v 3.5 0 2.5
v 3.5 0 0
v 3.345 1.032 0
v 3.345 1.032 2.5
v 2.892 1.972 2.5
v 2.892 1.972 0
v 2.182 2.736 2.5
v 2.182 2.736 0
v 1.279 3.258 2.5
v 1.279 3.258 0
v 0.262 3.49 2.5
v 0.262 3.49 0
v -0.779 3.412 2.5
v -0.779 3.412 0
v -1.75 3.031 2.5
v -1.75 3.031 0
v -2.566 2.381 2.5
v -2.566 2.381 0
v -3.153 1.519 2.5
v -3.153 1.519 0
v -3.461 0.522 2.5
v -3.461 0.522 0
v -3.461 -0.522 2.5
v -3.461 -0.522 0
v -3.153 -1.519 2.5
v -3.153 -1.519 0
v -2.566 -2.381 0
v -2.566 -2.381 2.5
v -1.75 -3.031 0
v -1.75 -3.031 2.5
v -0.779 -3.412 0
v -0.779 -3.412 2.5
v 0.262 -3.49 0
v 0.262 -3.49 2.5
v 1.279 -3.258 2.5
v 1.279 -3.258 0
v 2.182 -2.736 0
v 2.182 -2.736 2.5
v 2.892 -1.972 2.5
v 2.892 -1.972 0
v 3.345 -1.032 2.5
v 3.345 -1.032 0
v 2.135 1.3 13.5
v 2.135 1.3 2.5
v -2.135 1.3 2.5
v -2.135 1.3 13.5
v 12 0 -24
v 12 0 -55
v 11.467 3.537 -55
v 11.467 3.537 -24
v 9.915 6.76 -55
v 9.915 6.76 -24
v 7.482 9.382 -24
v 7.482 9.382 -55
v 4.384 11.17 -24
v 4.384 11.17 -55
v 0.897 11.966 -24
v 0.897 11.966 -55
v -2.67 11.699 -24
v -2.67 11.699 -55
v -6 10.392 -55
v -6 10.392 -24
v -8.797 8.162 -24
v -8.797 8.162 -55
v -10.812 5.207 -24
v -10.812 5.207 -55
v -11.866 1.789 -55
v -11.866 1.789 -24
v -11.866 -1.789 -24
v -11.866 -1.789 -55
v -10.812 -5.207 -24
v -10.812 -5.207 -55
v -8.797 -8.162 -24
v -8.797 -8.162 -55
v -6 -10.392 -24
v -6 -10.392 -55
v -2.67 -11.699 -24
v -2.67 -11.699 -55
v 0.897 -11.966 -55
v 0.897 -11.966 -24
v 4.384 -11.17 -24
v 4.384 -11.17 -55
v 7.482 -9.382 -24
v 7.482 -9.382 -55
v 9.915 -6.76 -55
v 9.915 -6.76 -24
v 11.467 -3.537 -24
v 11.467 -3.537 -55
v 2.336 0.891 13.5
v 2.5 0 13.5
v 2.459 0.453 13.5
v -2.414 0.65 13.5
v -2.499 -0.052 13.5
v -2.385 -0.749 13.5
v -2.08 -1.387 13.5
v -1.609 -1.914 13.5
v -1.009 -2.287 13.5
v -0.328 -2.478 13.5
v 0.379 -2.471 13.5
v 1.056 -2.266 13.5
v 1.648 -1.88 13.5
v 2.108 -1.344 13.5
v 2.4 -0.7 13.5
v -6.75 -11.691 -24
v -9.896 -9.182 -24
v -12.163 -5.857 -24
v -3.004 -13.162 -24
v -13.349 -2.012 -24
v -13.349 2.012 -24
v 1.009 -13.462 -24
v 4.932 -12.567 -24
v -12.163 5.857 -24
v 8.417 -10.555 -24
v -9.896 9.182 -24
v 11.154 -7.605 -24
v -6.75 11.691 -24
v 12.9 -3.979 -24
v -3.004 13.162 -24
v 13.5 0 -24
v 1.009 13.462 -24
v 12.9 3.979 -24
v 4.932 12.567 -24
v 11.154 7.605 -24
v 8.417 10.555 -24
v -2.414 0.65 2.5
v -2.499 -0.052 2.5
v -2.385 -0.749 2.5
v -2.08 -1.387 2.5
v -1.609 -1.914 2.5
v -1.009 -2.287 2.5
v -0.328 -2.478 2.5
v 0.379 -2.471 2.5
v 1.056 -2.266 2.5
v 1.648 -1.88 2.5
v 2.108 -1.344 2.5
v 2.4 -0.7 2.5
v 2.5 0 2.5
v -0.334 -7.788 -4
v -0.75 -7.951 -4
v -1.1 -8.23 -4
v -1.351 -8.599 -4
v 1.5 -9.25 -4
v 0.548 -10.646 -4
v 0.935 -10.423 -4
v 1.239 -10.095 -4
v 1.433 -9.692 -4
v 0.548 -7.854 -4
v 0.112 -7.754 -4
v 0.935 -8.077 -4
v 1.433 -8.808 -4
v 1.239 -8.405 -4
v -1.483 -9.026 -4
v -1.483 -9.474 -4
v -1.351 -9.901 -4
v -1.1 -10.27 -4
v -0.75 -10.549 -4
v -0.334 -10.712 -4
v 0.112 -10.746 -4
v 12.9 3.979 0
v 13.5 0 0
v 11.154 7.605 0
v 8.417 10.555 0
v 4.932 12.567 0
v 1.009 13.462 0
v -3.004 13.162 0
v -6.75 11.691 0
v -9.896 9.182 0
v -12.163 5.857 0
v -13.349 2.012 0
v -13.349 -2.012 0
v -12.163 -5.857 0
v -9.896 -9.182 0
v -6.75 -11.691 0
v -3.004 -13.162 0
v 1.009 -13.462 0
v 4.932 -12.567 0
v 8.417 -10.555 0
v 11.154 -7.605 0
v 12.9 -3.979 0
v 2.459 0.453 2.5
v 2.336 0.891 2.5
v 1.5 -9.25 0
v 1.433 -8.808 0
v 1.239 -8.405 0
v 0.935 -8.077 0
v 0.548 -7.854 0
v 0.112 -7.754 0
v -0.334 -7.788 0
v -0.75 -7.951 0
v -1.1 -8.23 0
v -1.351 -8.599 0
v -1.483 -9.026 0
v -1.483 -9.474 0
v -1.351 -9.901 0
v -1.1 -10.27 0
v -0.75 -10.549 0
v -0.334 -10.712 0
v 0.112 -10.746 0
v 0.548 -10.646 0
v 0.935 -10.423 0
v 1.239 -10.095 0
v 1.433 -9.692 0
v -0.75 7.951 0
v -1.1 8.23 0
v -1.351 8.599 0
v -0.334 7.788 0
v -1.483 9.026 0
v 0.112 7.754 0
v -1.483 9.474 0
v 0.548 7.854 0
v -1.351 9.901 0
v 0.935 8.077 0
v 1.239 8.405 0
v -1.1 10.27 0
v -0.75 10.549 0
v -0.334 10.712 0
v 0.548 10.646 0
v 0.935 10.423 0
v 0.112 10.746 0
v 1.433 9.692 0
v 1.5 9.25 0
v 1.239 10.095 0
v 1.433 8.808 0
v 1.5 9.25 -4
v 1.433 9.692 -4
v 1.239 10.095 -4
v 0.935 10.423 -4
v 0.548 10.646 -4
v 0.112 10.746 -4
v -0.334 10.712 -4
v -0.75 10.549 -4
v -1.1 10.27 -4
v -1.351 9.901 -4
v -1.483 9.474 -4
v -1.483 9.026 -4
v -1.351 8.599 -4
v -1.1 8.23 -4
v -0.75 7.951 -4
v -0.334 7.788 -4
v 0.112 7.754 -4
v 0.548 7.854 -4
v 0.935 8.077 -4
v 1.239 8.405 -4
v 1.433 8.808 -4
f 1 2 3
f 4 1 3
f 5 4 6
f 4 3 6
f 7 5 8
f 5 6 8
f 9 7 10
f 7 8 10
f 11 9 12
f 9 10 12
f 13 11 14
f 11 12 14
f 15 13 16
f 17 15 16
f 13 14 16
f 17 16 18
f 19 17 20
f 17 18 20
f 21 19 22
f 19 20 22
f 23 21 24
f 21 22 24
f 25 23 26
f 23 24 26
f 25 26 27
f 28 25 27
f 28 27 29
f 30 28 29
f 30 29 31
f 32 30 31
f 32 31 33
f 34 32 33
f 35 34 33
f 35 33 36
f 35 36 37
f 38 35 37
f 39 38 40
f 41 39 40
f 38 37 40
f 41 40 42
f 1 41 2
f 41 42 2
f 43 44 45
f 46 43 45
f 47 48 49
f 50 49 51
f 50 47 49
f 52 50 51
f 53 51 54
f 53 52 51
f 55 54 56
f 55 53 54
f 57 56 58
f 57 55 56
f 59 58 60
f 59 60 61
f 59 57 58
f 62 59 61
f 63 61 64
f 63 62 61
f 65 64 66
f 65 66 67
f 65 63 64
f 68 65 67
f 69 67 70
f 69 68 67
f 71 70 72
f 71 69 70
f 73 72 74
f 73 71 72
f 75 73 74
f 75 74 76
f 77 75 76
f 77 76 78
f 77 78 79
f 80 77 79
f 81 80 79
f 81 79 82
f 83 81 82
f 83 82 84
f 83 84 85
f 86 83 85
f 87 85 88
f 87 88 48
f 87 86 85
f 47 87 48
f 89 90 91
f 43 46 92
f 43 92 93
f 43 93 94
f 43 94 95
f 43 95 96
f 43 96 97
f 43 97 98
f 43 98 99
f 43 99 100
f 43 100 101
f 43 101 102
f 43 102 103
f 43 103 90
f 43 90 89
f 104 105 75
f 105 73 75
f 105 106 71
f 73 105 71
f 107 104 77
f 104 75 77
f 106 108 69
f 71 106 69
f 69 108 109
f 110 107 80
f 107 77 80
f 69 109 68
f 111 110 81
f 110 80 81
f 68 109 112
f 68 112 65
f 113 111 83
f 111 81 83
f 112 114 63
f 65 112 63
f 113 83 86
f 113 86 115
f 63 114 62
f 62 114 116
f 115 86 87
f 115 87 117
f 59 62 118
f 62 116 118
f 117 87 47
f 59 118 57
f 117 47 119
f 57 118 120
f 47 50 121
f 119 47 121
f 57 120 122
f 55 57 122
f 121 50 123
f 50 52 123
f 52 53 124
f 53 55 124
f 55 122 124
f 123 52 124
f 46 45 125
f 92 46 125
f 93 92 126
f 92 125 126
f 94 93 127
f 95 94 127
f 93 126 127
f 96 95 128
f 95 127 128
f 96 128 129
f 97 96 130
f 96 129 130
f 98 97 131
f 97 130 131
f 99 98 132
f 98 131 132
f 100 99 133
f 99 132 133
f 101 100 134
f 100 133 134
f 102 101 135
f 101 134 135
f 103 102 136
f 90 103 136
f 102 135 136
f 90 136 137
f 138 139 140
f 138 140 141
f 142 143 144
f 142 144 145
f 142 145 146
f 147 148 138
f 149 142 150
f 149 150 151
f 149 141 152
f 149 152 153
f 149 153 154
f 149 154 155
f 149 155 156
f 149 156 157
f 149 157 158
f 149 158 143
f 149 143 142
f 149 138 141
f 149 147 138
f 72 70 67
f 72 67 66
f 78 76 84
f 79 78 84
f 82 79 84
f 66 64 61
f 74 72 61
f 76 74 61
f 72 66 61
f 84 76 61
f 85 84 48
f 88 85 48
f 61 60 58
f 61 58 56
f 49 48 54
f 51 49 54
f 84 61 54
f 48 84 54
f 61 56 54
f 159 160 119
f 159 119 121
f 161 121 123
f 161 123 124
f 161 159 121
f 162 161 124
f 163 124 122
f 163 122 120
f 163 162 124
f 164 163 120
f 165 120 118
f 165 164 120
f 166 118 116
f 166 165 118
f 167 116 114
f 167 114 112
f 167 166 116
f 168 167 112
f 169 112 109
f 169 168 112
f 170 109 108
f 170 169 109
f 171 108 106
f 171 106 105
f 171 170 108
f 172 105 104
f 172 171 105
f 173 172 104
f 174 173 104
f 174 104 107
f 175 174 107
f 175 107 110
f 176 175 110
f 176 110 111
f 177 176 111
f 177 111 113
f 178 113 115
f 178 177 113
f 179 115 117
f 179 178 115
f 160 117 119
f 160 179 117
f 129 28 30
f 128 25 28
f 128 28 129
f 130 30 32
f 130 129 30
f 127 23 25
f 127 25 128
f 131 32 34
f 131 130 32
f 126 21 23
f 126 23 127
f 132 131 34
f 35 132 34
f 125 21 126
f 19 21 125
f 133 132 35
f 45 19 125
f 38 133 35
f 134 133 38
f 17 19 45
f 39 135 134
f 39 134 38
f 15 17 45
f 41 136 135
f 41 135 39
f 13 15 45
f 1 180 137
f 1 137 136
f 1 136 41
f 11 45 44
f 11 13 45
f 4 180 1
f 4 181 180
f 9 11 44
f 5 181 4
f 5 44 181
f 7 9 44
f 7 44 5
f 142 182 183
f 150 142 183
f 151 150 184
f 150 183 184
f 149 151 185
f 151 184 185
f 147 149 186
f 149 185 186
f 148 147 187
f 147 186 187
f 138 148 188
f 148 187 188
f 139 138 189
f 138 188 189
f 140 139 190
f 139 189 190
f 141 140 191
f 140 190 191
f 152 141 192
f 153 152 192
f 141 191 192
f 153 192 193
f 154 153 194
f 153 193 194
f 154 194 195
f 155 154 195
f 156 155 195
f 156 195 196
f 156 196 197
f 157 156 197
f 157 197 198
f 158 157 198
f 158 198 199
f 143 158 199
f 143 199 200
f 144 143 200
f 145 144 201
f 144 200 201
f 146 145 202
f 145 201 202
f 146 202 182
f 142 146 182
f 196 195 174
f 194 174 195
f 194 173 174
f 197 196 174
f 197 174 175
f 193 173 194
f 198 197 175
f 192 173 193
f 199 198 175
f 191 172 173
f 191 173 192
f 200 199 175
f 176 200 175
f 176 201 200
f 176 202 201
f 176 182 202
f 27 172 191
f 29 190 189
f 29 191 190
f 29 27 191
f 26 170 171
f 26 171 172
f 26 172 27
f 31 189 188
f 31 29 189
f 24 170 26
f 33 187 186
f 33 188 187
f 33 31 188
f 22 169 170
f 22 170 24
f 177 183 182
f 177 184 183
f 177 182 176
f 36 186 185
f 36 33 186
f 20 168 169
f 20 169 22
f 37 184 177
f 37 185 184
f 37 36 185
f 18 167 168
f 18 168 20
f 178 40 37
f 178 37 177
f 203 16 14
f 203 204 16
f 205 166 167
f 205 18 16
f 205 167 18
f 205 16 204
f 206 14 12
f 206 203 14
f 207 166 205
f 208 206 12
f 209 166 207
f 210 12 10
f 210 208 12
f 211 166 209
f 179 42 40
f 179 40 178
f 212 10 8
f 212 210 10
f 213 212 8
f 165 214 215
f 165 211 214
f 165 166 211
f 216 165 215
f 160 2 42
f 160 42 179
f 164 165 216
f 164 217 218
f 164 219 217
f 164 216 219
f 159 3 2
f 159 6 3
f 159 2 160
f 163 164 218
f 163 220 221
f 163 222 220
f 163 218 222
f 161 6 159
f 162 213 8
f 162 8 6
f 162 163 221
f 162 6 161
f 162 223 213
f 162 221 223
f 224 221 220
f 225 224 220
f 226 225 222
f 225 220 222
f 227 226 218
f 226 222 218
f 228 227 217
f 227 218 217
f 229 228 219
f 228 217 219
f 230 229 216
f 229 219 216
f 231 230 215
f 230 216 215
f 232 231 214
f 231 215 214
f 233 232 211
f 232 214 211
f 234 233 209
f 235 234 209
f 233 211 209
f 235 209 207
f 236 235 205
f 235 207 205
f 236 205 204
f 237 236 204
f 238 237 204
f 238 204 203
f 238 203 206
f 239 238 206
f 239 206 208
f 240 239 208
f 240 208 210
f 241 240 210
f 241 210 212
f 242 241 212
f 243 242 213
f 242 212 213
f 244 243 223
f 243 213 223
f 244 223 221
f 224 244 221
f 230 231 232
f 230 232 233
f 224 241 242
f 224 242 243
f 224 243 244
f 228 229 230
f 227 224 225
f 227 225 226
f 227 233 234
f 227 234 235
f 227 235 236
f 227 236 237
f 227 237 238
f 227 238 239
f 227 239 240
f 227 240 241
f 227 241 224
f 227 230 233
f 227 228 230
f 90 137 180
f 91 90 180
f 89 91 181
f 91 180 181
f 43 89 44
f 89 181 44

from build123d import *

# Parameters (mm, degrees)
SKETCH1_R           = 13.5
BOSS_EXTRUDE1_DEPTH = 24
BOSS_EXTRUDE2_START = -24
SKETCH1_3_R         = 12
BOSS_EXTRUDE2_DEPTH = 31
SKETCH2_R           = 3.5
BOSS_EXTRUDE3_DEPTH = 2.5
BOSS_EXTRUDE4_START = 2.5
BOSS_EXTRUDE4_DEPTH = 11
SKETCH3_R           = 1.5
CUT_EXTRUDE1_DEPTH  = 4


with BuildPart() as part:
    # Sketch1 → Boss-Extrude1 (new body)
    with BuildSketch(Plane.XY):
        Circle(SKETCH1_R)
    extrude(amount=-BOSS_EXTRUDE1_DEPTH)

    # Sketch1<3> → Boss-Extrude2 (add)
    with BuildSketch(Plane.XY.offset(BOSS_EXTRUDE2_START)):
        Circle(SKETCH1_3_R)
    extrude(amount=-BOSS_EXTRUDE2_DEPTH)

    # Sketch2 → Boss-Extrude3 (add)
    with BuildSketch(Plane.XY):
        Circle(SKETCH2_R)
    extrude(amount=BOSS_EXTRUDE3_DEPTH)

    # Sketch2<3> → Boss-Extrude4 (add)
    with BuildSketch(Plane.XY.offset(BOSS_EXTRUDE4_START)):
        with BuildLine():
            Line((2.13541565, 1.3), (-2.13541565, 1.3))
            ThreePointArc((-2.13541565, 1.3), (-0.675078097, -2.407128905), (2.5, 0))
            ThreePointArc((2.5, 0), (2.407128905, 0.675078097), (2.13541565, 1.3))
        make_face()
    extrude(amount=BOSS_EXTRUDE4_DEPTH)

    # Sketch3 → Cut-Extrude1 (cut)
    with BuildSketch(Plane.XY):
        with Locations((0, 9.25)):
            Circle(SKETCH3_R)
        with Locations((0, -9.25)):
            Circle(SKETCH3_R)
    extrude(amount=-CUT_EXTRUDE1_DEPTH, mode=Mode.SUBTRACT)


solid = part.part
